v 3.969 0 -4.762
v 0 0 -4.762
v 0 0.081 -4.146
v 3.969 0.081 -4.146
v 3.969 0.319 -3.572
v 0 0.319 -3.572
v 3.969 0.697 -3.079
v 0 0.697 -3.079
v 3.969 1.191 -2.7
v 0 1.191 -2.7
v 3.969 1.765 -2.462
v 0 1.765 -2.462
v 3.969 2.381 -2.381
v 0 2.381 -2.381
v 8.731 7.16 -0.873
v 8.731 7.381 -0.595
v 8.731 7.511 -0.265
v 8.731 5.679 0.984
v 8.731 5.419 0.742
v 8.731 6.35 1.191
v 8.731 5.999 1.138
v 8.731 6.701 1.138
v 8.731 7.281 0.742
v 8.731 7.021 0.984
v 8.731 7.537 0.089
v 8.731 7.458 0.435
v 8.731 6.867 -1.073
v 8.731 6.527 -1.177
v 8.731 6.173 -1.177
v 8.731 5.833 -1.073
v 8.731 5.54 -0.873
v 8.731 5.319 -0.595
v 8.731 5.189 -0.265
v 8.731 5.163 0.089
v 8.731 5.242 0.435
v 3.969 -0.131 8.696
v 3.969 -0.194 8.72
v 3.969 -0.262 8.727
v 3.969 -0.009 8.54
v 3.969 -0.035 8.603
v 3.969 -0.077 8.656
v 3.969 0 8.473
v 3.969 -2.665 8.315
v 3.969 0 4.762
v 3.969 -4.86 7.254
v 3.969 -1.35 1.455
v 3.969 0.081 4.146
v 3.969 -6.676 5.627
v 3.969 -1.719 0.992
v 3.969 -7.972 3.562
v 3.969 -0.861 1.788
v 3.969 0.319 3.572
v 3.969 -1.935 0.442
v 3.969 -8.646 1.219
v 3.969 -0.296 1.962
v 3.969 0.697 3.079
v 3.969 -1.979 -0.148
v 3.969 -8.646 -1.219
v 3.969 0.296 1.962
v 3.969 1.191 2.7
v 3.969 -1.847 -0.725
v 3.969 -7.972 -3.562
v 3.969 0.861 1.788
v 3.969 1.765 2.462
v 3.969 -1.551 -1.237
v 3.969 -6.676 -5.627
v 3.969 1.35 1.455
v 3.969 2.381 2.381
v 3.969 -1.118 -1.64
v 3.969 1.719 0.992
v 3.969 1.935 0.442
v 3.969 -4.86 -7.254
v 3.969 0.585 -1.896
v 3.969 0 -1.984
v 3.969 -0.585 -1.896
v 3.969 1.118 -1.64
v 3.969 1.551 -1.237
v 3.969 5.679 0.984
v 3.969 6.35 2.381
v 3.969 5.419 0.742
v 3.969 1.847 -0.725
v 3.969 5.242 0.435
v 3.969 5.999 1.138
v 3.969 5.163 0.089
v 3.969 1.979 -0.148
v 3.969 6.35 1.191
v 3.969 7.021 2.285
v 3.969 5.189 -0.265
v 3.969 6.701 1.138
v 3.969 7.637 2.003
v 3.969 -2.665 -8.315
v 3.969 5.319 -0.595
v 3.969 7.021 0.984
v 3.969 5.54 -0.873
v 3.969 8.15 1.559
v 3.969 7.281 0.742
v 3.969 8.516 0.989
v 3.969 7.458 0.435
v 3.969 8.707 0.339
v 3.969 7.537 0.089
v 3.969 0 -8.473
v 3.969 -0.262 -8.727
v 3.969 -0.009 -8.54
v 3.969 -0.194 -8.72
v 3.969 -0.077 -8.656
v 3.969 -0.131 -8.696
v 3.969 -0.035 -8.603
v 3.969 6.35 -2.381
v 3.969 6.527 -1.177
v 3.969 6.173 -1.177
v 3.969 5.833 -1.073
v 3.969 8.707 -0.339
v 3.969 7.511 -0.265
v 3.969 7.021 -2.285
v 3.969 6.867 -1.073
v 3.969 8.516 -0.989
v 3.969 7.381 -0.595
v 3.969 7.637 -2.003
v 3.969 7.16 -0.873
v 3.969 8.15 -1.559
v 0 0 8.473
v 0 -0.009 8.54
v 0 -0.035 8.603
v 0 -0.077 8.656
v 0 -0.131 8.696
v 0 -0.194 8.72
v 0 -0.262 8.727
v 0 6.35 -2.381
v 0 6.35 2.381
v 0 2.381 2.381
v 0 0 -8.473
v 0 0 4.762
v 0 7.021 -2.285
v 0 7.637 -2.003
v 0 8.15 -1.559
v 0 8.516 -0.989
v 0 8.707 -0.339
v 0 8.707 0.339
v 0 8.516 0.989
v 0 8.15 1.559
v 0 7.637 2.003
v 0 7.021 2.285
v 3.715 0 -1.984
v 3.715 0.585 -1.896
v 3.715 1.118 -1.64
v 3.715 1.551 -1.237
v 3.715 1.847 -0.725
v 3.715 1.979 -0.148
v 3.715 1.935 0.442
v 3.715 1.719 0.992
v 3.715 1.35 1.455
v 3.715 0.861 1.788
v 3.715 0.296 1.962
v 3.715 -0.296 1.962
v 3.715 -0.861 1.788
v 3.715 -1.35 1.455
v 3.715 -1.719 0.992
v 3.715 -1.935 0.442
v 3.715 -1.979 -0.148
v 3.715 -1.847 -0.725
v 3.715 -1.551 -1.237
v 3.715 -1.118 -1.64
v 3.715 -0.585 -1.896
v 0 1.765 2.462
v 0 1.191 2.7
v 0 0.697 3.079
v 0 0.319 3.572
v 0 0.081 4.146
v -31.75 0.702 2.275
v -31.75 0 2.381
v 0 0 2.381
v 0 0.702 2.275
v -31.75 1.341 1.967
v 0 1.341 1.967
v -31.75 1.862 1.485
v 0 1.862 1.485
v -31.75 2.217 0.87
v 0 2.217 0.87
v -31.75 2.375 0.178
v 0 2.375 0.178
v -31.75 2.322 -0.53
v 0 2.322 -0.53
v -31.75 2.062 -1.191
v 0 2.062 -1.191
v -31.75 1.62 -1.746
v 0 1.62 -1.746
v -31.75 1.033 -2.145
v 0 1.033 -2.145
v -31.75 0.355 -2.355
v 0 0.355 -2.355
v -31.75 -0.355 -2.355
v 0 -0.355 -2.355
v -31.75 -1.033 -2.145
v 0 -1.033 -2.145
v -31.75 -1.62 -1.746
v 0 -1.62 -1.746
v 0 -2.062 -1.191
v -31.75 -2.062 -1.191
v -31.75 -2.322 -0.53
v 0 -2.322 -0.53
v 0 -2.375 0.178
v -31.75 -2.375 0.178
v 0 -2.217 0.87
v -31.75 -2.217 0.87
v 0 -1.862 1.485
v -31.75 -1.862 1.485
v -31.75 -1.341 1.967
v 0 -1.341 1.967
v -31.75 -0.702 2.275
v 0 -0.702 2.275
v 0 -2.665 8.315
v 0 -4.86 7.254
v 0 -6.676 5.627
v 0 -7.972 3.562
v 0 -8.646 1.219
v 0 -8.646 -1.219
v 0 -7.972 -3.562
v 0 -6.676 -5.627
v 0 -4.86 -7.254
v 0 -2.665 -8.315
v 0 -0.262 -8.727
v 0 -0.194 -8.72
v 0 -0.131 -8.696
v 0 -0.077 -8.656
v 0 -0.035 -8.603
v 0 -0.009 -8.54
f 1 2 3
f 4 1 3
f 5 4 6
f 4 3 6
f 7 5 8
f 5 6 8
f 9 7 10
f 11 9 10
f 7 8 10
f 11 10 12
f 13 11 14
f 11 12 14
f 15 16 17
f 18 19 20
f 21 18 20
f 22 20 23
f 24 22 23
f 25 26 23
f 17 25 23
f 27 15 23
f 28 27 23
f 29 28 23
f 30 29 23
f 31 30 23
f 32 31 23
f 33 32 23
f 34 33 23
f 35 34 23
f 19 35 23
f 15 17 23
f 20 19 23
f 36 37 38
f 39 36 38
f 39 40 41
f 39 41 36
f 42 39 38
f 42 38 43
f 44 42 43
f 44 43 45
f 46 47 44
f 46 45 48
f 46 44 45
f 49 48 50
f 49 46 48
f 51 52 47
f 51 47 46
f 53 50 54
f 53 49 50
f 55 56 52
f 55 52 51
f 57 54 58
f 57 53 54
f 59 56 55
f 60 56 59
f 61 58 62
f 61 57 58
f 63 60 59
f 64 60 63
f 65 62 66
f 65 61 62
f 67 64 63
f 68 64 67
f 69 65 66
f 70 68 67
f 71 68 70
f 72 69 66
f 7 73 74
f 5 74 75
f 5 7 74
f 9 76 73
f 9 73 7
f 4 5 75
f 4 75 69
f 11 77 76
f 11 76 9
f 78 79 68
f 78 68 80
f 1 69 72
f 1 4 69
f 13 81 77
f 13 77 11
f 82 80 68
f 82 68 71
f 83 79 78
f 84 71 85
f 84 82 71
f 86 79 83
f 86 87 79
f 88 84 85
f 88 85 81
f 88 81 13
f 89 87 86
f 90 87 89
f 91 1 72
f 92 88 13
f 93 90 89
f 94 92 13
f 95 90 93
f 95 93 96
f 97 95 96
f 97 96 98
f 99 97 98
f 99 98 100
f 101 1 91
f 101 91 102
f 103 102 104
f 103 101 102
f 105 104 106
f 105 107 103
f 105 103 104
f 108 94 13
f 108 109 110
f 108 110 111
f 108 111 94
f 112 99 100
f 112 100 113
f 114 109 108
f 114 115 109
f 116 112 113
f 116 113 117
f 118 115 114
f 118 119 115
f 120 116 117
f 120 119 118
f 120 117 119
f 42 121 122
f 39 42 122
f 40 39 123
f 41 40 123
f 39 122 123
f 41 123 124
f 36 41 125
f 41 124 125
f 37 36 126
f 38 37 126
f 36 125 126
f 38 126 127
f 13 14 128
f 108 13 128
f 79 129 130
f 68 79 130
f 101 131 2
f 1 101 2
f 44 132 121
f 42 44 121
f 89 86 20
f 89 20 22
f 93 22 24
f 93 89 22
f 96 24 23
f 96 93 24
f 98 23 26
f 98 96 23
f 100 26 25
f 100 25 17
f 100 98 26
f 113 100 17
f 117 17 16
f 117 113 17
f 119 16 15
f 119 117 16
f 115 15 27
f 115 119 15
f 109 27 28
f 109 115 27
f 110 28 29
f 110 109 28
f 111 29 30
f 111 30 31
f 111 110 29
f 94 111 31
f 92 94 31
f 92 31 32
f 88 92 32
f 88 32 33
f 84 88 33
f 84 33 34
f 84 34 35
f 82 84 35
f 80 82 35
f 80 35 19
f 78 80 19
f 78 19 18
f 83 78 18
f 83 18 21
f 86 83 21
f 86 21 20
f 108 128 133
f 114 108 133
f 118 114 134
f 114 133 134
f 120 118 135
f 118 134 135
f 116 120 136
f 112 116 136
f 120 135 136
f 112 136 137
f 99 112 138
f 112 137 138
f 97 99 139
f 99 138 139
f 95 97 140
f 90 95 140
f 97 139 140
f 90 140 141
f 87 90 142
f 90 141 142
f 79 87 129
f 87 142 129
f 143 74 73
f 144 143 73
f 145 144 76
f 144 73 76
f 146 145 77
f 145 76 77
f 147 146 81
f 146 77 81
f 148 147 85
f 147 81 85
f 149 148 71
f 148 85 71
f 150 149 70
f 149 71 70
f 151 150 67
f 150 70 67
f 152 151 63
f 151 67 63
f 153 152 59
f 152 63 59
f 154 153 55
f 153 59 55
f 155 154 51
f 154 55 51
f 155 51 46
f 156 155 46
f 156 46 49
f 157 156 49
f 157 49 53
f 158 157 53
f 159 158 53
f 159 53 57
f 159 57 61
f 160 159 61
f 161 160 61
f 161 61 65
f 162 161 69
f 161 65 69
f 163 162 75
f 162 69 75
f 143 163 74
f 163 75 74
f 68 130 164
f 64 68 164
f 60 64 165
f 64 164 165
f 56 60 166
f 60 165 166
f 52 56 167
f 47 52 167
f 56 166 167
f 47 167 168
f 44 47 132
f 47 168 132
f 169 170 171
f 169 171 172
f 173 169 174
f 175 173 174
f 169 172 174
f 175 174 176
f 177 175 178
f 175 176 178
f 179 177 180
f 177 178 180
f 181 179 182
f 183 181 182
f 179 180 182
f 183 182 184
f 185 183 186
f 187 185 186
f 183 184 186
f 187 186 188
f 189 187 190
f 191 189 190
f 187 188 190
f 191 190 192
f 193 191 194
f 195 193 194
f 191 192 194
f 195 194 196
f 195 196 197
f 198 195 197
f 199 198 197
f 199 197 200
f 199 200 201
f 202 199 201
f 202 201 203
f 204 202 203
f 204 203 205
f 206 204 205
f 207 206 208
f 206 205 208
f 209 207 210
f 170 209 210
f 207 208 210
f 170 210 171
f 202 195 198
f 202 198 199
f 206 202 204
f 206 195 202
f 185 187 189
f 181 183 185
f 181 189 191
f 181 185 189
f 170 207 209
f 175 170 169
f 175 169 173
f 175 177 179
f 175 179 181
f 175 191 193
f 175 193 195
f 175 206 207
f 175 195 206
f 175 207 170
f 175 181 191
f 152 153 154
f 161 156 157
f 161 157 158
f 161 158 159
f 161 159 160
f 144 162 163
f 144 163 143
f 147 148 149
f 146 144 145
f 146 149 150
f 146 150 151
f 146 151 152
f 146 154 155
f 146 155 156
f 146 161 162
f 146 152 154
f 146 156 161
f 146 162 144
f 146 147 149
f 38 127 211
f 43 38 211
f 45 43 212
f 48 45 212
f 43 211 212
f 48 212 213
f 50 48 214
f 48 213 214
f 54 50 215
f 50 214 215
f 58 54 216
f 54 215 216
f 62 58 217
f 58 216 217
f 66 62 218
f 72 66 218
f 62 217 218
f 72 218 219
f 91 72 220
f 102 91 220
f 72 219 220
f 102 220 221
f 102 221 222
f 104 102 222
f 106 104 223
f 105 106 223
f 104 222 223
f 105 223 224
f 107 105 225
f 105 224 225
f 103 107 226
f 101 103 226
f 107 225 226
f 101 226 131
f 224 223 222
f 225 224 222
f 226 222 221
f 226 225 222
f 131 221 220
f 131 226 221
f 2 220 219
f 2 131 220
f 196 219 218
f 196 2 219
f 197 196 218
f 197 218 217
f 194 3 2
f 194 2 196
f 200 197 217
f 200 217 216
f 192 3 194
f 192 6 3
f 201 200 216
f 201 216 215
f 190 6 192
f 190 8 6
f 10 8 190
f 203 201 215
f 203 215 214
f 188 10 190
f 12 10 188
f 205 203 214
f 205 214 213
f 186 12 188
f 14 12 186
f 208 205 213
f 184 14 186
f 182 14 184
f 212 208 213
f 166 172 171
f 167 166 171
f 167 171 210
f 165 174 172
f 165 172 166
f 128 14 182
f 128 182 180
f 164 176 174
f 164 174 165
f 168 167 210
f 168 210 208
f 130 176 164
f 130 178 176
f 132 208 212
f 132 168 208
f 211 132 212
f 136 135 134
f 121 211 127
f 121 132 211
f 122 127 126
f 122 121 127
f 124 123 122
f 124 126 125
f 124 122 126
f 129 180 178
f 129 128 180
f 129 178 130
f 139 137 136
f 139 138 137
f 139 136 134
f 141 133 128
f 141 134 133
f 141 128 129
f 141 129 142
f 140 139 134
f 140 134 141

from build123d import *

# Parameters (mm, degrees)
BOSS_EXTRUDE1_DEPTH = 3.96875
SKETCH4_R           = 2.38125
BOSS_EXTRUDE2_DEPTH = 31.75
SKETCH4_3_R         = 1.190625
BOSS_EXTRUDE3_DEPTH = 8.73125
SKETCH5_R           = 1.984375
CUT_EXTRUDE1_DEPTH  = 0.254


with BuildPart() as part:
    # Sketch3 → Boss-Extrude1 (new body)
    with BuildSketch(Plane(origin=(0, 0, 0), x_dir=(0, 0, -1), z_dir=(1, 0, 0))):
        with BuildLine():
            Line((-2.38125, 6.35), (-2.38125, 2.38125))
            ThreePointArc((-2.38125, 2.38125), (-3.078701977, 0.697451977), (-4.7625, 0))
            Line((-4.7625, 0), (-8.473443902, 0))
            ThreePointArc((-8.473443902, 0), (-8.655719879, -0.077106054), (-8.727329862, -0.261610487))
            ThreePointArc((-8.727329862, -0.261610487), (0, -8.73125), (8.727329862, -0.261610487))
            ThreePointArc((8.727329862, -0.261610487), (8.655719879, -0.077106054), (8.473443902, 0))
            Line((8.473443902, 0), (4.7625, 0))
            ThreePointArc((4.7625, 0), (3.078701977, 0.697451977), (2.38125, 2.38125))
            Line((2.38125, 2.38125), (2.38125, 6.35))
            ThreePointArc((2.38125, 6.35), (0, 8.73125), (-2.38125, 6.35))
        make_face()
    extrude(amount=BOSS_EXTRUDE1_DEPTH)

    # Sketch4 → Boss-Extrude2 (add)
    with BuildSketch(Plane.ZY):
        Circle(SKETCH4_R)
    extrude(amount=BOSS_EXTRUDE2_DEPTH)

    # Sketch4<3> → Boss-Extrude3 (add)
    with BuildSketch(Plane.ZY):
        with Locations((0, 6.35)):
            Circle(SKETCH4_3_R)
    extrude(amount=-BOSS_EXTRUDE3_DEPTH)

    # Sketch5 → Cut-Extrude1 (cut)
    with BuildSketch(Plane(origin=(3.96875, 0, 0), x_dir=(0, 0, -1), z_dir=(1, 0, 0))):
        Circle(SKETCH5_R)
    extrude(amount=-CUT_EXTRUDE1_DEPTH, mode=Mode.SUBTRACT)


solid = part.part
